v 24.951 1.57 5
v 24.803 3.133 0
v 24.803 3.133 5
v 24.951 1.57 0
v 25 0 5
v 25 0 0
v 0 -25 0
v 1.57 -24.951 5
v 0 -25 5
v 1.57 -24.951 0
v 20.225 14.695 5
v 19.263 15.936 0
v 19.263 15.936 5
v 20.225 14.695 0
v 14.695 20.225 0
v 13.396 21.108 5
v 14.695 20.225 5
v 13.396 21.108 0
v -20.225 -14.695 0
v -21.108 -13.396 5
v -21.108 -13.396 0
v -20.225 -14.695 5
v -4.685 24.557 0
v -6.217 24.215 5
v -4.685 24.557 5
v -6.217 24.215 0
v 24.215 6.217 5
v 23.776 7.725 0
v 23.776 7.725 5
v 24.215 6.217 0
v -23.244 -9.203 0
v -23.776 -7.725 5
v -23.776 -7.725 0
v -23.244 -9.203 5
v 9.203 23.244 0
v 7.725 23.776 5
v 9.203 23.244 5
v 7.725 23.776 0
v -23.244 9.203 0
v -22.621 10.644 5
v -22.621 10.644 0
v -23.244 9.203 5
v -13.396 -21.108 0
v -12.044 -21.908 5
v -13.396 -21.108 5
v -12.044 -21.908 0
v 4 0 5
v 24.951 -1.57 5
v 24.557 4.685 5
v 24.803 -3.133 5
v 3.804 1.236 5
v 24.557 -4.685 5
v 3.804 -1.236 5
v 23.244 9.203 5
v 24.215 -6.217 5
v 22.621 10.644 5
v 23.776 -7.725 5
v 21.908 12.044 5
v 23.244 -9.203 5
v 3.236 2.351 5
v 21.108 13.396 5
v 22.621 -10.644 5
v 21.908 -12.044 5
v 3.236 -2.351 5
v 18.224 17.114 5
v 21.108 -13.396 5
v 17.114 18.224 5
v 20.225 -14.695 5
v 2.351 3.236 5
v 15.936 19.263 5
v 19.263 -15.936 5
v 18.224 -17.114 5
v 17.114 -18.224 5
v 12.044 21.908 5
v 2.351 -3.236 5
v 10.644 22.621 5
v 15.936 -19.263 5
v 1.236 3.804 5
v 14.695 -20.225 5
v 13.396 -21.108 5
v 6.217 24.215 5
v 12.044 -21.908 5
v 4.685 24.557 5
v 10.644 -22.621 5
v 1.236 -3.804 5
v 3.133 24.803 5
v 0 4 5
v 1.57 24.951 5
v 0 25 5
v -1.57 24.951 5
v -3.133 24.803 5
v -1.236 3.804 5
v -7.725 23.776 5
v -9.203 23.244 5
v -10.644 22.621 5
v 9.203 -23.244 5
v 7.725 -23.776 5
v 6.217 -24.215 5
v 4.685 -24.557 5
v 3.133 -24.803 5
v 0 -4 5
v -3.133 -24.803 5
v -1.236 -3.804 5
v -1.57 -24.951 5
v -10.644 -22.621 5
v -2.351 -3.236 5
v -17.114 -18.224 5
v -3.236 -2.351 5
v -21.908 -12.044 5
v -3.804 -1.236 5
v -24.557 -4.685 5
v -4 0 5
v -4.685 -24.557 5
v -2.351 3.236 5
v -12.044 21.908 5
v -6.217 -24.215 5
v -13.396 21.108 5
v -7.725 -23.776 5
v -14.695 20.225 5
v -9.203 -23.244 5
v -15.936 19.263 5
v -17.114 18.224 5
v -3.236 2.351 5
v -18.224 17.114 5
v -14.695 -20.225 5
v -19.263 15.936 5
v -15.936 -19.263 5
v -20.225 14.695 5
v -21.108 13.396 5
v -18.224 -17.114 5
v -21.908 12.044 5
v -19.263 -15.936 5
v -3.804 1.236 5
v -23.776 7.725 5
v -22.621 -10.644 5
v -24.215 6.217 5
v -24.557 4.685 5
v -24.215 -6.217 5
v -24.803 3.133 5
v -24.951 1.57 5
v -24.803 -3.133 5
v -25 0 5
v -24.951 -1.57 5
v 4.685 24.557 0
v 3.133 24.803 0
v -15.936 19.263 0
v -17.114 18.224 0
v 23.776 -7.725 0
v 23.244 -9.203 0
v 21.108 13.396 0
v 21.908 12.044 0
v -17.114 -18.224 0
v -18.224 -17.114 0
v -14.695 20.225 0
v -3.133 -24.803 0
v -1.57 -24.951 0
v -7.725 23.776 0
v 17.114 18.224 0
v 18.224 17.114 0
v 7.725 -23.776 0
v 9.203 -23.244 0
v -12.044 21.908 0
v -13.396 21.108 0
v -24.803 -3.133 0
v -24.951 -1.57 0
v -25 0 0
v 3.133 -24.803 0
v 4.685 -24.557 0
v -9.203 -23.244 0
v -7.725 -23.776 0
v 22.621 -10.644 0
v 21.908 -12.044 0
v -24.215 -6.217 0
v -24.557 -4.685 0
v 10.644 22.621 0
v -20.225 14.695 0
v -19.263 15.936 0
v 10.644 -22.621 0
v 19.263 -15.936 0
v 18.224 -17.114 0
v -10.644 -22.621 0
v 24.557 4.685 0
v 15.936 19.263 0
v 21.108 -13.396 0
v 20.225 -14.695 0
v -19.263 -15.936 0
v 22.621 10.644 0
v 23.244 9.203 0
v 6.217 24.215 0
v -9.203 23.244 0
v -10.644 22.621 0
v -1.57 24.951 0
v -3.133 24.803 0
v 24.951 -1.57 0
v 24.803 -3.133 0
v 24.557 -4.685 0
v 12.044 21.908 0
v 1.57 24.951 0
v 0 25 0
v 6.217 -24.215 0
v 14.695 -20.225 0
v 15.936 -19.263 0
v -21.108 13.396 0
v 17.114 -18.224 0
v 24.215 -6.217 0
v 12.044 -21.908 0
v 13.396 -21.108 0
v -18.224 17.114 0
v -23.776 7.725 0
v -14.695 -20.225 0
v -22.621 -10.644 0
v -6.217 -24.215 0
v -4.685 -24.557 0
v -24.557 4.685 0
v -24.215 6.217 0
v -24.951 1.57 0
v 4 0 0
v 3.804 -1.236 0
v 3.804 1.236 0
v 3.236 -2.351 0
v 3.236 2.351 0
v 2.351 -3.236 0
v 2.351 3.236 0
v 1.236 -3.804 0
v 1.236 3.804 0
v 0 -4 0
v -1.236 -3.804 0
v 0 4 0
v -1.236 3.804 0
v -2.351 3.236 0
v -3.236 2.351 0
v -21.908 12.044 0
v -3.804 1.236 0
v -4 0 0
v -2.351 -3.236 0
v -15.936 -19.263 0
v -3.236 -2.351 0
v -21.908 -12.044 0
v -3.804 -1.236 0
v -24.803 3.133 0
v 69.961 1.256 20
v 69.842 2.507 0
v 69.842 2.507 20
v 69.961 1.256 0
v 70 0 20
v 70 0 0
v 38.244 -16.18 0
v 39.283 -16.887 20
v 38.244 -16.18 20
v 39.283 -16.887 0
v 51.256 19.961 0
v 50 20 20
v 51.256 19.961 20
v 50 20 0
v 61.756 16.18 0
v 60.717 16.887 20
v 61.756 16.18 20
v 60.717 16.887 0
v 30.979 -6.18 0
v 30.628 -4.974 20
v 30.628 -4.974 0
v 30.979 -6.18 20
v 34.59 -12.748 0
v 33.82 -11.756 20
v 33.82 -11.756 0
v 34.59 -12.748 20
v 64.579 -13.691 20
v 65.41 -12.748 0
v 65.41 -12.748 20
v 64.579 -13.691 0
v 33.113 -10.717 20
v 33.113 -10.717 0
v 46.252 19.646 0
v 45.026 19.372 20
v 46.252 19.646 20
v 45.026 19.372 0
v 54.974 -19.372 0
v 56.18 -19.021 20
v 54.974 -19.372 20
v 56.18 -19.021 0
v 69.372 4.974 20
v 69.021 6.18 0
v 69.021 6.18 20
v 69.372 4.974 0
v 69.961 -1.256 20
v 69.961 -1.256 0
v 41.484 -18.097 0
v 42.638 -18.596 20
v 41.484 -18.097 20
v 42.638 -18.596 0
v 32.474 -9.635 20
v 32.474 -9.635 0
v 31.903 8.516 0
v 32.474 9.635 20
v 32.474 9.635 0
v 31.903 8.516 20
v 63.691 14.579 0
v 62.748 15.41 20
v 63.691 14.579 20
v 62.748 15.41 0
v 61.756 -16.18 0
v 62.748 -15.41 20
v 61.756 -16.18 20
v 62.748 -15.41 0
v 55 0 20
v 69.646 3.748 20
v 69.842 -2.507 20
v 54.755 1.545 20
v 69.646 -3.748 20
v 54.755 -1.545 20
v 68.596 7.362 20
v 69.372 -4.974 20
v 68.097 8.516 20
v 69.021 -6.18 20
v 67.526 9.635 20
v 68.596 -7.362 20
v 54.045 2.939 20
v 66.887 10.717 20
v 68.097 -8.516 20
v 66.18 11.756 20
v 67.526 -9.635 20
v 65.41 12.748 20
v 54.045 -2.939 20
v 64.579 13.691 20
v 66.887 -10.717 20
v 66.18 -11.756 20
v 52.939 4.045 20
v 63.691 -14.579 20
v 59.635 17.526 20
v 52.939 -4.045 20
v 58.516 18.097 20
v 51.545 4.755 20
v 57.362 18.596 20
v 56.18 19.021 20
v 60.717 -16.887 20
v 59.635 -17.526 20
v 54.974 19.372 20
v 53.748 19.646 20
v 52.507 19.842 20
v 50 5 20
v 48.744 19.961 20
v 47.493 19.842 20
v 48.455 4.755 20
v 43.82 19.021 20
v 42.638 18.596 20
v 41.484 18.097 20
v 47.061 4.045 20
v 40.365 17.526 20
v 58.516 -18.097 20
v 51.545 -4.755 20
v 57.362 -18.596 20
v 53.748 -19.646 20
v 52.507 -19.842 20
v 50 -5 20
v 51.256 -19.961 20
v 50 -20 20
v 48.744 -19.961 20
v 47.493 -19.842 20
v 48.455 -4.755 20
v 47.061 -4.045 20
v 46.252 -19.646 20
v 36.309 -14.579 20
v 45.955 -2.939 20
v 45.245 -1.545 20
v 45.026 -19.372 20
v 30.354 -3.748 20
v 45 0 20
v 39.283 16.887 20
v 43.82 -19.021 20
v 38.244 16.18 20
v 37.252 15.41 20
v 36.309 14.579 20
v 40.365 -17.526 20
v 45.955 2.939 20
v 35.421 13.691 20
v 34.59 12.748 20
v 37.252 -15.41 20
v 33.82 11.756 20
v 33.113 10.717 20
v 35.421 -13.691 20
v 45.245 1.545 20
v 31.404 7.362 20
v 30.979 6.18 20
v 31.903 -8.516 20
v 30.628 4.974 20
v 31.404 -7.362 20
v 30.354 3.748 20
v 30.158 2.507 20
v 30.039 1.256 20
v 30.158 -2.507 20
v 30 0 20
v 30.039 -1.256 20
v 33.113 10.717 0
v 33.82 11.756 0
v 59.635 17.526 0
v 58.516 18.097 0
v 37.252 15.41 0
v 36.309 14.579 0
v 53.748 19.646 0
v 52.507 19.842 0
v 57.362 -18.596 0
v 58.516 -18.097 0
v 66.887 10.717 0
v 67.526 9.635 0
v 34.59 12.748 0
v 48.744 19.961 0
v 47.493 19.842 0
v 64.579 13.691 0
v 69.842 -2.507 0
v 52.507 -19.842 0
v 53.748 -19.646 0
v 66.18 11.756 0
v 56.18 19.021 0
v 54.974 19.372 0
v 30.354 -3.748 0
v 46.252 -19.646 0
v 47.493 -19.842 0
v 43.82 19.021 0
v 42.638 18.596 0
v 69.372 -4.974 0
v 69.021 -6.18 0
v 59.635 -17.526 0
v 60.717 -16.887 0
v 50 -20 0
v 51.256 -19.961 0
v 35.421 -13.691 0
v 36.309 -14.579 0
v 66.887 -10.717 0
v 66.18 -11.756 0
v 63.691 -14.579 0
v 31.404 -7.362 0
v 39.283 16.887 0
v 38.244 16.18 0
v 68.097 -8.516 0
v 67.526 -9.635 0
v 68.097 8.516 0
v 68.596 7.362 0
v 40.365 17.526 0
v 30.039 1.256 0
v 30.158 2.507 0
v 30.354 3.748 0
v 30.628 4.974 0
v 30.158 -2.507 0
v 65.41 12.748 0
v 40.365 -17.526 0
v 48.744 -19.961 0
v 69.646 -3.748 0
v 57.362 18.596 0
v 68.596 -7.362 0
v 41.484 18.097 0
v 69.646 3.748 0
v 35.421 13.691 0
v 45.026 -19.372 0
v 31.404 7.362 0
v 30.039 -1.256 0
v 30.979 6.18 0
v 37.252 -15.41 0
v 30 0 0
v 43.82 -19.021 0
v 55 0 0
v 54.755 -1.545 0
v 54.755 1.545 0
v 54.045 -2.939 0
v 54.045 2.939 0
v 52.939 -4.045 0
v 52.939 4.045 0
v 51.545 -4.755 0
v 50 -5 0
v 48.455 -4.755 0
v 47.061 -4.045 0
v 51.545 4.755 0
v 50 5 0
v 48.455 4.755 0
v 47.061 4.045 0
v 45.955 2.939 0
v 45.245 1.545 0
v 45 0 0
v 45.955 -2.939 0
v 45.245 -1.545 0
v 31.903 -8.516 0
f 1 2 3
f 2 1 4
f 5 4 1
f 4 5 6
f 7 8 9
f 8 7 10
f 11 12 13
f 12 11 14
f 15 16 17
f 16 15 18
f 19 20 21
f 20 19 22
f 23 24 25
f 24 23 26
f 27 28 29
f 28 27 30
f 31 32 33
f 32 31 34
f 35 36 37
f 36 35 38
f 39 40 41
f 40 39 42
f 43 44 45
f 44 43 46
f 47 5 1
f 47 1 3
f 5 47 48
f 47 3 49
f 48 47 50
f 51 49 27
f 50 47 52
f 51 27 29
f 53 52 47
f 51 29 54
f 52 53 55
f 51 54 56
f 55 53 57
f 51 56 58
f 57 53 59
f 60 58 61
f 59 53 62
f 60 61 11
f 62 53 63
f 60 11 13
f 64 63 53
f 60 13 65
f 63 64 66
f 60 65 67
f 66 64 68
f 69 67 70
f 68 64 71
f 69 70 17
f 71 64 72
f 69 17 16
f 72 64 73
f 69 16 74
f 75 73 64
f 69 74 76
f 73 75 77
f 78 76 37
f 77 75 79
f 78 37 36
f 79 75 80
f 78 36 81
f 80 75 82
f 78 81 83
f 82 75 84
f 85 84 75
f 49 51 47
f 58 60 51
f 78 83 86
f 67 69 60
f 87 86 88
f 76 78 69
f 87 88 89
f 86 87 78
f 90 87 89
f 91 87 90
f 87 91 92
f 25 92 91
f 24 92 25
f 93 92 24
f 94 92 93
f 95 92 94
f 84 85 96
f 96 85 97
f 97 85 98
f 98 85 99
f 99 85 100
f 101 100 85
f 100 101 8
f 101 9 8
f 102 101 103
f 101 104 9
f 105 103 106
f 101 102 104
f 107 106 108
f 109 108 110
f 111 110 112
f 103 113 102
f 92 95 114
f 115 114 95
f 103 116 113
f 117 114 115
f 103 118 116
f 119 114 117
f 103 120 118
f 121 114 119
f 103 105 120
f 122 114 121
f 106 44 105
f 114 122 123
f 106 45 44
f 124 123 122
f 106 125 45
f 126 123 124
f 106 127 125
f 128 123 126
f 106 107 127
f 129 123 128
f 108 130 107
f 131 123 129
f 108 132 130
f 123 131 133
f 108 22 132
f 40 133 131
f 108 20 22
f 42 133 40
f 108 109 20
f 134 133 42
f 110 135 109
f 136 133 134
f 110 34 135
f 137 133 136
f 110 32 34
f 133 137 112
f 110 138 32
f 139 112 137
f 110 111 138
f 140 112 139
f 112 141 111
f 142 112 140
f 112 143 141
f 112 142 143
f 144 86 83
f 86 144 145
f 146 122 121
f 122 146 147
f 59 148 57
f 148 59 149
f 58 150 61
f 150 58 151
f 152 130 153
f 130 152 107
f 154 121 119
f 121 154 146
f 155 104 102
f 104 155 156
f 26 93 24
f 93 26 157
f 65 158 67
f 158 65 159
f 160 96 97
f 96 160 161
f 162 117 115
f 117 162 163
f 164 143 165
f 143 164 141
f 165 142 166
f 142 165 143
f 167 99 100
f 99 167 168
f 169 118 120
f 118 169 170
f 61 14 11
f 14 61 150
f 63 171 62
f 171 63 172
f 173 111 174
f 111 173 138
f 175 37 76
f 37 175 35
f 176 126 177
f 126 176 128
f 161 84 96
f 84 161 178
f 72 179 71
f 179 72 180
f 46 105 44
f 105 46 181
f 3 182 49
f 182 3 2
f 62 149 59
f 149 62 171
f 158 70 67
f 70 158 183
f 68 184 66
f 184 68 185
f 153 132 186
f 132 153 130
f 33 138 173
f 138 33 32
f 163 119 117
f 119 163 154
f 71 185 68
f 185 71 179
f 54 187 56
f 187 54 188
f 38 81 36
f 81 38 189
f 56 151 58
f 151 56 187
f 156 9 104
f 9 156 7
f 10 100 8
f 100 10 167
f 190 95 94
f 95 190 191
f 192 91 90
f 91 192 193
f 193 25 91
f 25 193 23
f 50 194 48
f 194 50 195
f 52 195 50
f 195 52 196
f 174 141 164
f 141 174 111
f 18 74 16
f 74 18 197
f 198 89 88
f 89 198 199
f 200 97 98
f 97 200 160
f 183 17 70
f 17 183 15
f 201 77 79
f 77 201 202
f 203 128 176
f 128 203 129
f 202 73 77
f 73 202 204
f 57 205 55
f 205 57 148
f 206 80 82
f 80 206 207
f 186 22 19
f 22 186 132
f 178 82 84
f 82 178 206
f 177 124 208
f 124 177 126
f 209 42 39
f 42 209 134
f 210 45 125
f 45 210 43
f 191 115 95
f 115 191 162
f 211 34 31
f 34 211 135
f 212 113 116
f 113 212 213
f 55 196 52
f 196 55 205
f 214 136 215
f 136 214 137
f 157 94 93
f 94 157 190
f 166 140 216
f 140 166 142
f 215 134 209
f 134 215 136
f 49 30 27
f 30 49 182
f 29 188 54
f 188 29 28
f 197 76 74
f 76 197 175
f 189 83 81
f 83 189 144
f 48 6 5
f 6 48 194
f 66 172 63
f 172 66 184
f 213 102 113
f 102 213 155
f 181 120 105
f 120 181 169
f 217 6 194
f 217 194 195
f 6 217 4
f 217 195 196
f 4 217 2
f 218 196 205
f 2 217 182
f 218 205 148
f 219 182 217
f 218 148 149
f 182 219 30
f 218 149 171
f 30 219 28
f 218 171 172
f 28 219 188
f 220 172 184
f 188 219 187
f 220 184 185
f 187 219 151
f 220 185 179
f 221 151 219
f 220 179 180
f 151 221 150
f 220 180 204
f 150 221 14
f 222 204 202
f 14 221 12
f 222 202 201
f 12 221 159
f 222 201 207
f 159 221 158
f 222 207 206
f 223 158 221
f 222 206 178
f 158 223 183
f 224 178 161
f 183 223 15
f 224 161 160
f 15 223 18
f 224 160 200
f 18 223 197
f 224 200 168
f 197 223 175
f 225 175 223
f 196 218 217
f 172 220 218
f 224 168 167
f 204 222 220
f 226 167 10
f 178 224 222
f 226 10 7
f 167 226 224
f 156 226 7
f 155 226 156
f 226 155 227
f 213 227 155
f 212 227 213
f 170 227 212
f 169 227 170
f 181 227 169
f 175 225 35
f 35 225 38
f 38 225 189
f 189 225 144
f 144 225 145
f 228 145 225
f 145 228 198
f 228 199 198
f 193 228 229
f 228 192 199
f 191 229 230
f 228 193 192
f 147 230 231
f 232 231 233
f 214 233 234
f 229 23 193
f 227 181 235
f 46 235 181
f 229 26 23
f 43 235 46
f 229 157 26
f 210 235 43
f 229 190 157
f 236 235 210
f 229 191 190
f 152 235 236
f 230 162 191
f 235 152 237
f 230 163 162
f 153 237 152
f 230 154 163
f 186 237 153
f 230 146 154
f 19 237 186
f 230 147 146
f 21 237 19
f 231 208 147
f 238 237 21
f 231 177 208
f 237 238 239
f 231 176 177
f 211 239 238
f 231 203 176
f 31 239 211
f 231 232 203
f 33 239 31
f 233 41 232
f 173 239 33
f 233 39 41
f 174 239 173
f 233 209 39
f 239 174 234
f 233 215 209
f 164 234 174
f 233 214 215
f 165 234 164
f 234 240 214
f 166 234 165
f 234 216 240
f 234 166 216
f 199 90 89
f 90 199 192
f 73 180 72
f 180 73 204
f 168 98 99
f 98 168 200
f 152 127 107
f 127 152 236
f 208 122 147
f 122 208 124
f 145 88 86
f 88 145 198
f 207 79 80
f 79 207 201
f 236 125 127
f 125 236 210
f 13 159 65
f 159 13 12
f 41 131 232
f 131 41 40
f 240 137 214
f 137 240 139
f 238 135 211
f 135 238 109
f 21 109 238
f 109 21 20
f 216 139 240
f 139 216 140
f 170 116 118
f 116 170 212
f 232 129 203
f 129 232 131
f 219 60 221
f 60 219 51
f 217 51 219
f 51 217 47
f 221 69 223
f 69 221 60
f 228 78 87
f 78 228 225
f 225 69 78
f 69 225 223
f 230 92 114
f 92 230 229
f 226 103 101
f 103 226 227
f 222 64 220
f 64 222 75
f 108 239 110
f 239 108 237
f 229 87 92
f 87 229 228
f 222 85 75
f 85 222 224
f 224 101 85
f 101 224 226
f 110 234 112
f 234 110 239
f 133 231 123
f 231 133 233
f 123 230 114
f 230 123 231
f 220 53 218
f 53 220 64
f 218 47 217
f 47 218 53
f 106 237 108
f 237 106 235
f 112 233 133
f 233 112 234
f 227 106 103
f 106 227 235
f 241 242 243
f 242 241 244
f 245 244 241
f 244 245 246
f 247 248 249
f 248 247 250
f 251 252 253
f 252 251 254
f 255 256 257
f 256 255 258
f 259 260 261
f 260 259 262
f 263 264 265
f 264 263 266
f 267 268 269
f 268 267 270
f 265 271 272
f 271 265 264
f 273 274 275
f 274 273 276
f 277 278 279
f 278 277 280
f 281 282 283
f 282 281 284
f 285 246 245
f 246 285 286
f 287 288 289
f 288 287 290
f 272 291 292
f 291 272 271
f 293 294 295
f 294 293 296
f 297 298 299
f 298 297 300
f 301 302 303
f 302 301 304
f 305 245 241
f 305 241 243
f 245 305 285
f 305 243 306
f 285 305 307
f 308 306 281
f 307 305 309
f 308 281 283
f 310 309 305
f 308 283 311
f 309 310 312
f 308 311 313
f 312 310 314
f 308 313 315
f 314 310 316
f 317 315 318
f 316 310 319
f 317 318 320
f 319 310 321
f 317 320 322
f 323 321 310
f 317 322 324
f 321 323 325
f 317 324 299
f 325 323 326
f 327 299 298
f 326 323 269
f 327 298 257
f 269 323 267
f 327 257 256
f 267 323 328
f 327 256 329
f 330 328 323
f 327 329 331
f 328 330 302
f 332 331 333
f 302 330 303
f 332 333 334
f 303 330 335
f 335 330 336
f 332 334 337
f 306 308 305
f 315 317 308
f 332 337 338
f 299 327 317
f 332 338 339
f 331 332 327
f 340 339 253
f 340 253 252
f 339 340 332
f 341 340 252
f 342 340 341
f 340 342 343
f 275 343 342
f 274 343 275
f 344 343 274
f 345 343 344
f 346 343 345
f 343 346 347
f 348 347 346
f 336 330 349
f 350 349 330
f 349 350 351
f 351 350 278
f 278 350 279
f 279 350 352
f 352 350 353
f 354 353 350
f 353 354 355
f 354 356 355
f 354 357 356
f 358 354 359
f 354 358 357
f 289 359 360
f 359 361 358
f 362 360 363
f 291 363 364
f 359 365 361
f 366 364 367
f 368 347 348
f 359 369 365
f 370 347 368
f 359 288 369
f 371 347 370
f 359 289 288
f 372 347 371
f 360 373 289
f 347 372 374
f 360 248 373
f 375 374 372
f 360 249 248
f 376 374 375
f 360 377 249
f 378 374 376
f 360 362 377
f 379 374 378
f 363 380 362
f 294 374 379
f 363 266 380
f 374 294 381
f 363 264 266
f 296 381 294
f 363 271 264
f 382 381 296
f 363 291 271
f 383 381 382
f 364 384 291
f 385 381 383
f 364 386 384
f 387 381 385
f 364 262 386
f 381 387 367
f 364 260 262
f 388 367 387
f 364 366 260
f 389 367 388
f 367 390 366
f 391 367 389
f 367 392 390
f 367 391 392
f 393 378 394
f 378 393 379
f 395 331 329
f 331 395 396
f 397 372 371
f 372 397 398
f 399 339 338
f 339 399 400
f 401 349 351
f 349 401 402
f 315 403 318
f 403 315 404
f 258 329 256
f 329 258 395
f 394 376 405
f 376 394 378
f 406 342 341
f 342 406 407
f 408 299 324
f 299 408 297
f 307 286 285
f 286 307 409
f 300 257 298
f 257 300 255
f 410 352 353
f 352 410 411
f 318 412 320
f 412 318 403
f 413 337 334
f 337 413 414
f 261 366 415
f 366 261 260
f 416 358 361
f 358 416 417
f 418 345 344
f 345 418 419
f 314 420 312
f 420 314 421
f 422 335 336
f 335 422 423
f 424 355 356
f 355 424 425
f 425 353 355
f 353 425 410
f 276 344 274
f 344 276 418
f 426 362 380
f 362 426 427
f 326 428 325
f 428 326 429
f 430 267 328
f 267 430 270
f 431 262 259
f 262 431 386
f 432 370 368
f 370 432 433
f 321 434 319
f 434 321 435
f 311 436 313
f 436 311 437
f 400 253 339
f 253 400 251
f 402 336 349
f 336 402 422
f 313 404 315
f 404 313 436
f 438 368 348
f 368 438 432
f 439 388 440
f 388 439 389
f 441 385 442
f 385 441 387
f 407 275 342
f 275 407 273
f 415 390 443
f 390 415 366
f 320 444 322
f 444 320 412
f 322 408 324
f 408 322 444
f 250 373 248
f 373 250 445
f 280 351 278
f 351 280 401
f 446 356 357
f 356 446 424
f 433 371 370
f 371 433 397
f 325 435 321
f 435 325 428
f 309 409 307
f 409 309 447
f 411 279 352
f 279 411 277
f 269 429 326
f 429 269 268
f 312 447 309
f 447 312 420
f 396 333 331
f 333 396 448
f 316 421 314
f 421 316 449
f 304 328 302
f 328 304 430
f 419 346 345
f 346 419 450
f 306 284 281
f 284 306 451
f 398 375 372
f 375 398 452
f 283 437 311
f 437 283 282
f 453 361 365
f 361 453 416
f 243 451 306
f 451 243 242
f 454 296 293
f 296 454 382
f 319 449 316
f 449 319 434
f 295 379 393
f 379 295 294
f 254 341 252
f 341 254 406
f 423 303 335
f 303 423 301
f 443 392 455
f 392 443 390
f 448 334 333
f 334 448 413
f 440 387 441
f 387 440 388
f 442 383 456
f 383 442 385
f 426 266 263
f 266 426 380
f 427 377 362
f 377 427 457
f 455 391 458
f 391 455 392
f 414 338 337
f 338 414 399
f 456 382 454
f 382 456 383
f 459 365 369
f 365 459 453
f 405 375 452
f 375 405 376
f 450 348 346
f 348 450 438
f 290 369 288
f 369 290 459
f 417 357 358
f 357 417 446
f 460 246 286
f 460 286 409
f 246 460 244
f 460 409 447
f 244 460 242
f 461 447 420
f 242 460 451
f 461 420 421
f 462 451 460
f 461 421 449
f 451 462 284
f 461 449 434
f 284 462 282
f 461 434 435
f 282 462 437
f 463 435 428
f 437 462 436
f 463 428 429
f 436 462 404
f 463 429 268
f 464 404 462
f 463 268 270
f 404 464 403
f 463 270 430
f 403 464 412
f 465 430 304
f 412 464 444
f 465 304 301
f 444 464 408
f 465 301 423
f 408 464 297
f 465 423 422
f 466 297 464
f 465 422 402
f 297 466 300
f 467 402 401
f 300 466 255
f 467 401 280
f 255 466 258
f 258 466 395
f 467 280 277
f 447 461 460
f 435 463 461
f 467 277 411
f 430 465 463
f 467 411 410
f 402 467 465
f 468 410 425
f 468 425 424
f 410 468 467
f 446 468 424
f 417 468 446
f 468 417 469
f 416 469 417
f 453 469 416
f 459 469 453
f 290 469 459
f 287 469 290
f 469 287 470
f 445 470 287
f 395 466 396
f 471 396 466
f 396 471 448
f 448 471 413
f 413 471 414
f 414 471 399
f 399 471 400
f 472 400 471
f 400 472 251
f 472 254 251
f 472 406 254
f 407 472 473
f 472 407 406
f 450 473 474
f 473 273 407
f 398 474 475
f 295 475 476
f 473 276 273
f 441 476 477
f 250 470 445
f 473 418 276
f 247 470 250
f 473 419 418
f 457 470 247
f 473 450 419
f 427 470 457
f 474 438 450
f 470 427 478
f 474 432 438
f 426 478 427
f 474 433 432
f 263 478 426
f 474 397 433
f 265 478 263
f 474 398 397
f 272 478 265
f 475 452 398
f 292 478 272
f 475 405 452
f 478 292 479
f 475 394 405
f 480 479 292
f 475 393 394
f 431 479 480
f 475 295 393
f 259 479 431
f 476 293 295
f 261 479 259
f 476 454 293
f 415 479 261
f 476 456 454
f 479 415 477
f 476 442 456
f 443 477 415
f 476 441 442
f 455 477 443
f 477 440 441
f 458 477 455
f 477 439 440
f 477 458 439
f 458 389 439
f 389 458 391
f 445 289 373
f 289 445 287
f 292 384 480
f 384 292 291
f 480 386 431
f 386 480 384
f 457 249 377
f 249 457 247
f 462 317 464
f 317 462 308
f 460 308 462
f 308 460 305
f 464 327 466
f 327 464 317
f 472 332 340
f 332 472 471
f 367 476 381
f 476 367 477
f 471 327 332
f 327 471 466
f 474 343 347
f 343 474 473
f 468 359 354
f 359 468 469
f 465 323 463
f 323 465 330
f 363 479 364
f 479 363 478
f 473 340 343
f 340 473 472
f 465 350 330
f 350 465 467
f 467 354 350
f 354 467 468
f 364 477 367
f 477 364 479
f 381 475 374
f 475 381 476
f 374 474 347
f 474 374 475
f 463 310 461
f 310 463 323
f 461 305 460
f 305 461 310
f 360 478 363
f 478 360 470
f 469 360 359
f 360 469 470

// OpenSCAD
// file: utils/build_plate.scad
// Build Plate representation module
// Made by Makerbot (http://curriculum.makerbot.com/daily_lessons/february/openscad_buildplate.html)

//use this to include a build plate visualization in your openSCAD scripts. Very useful for things designed to be edited in Makerbot Customizer

//to use, either include or use <utils/build_plate.scad>

//then just call build_plate(); with the following arguments (also, you have to have a real object in your scene for this to render)

//putting 0 as the first argument will give you a Replicator 2 build plate
//putting 1 as the first argument will give you a Replicator 1 build plate
//putting 2 as the first argument will give you a Thingomatic build plate
//putting 3 as the first argument will give you a manually adjustable build plate (note: if you use this option, you need to specify your build plates X length (in mm) as the second argument and the Y length (in mm) as the third argument. eg. build_plate(3,150,120);)

/*

to give your user control of which build plate they see in Customizer, include the following code:

use <utils/build_plate.scad>

//for display only, doesn't contribute to final object
build_plate_selector = 0; //[0:Replicator 2,1: Replicator,2:Thingomatic,3:Manual]
//when Build Plate Selector is set to "manual" this controls the build plate x dimension
build_plate_manual_x = 100; //[100:400]
//when Build Plate Selector is set to "manual" this controls the build plate y dimension
build_plate_manual_y = 100; //[100:400]

build_plate(build_plate_selector,build_plate_manual_x,build_plate_manual_y);

*/




//to see how this works, uncomment the following code

//build_plate_selector = 0; //[0:Replicator 2,1: Replicator,2:Thingomatic,3:Manual]
//build_plate_manual_x = 100; //[100:400]
//build_plate_manual_y = 100; //[100:400]
//
//build_plate(build_plate_selector,build_plate_manual_x,build_plate_manual_y);
//
//cube(5);


module build_plate(bp,manX,manY){

		translate([0,0,-.52]){
			if(bp == 0){
				%cube([285,153,1],center = true);
			}
			if(bp == 1){
				%cube([225,145,1],center = true);
			}
			if(bp == 2){
				%cube([120,120,1],center = true);
			}
			if(bp == 3){
				%cube([manX,manY,1],center = true);
			}
		
		}
		translate([0,0,-.5]){
			if(bp == 0){
				for(i = [-14:14]){
					translate([i*10,0,0])
					%cube([.5,153,1.01],center = true);
				}
				for(i = [-7:7]){
					translate([0,i*10,0])
					%cube([285,.5,1.01],center = true);
				}	
			}
			if(bp == 1){
				for(i = [-11:11]){
					translate([i*10,0,0])
						%cube([.5,145,1.01],center = true);
				}
				for(i = [-7:7]){
					translate([0,i*10,0])
						%cube([225,.5,1.01],center = true);
				}
			}
			if(bp == 2){
				for(i = [-6:6]){
					translate([i*10,0,0])
						%cube([.5,120,1.01],center = true);
				}
				for(i = [-6:6]){
					translate([0,i*10,0])
						%cube([120,.5,1.01],center = true);
				}
			}
			if(bp == 3){
				for(i = [-(floor(manX/20)):floor(manX/20)]){
					translate([i*10,0,0])
						%cube([.5,manY,1.01],center = true);
				}
				for(i = [-(floor(manY/20)):floor(manY/20)]){
					translate([0,i*10,0])
						%cube([manX,.5,1.01],center = true);
				}
			}
		}
}
// main file
use <./utils/build_plate.scad> // Cuadricula transparente para la base
build_plate(3, 200,100); // No se incluye al renderizar


//----------------------------------------------------------
//-- Tutorial OpenScad
//-- Juan Gonzalez-Gomez (Obijuan) juan@iearobotics.com
//----------------------------------------------------------
//-- (c) Mayo, 2012
//-- Licencia GPL
//----------------------------------------------------------
//-- Rueda modularizada. Ejemplo de como definir modulos
//----------------------------------------------------------

module rueda_simple(grosor, diametro, diam_eje)
{
  //-- Construcción de la rueda a partir de
  //-- los parámetros
  difference() {
    //-- Base de la rueda
    cylinder(r=diametro/2, h=grosor,$fn=100);

    //-- Taladro del eje
    cylinder(r=diam_eje/2, h=3*grosor,$fn=20,center=true);
  }
}

rueda_simple(diametro=50, grosor=5, diam_eje=8);

translate([50,0,0])
  rueda_simple(diametro=40, grosor=20, diam_eje=10);
